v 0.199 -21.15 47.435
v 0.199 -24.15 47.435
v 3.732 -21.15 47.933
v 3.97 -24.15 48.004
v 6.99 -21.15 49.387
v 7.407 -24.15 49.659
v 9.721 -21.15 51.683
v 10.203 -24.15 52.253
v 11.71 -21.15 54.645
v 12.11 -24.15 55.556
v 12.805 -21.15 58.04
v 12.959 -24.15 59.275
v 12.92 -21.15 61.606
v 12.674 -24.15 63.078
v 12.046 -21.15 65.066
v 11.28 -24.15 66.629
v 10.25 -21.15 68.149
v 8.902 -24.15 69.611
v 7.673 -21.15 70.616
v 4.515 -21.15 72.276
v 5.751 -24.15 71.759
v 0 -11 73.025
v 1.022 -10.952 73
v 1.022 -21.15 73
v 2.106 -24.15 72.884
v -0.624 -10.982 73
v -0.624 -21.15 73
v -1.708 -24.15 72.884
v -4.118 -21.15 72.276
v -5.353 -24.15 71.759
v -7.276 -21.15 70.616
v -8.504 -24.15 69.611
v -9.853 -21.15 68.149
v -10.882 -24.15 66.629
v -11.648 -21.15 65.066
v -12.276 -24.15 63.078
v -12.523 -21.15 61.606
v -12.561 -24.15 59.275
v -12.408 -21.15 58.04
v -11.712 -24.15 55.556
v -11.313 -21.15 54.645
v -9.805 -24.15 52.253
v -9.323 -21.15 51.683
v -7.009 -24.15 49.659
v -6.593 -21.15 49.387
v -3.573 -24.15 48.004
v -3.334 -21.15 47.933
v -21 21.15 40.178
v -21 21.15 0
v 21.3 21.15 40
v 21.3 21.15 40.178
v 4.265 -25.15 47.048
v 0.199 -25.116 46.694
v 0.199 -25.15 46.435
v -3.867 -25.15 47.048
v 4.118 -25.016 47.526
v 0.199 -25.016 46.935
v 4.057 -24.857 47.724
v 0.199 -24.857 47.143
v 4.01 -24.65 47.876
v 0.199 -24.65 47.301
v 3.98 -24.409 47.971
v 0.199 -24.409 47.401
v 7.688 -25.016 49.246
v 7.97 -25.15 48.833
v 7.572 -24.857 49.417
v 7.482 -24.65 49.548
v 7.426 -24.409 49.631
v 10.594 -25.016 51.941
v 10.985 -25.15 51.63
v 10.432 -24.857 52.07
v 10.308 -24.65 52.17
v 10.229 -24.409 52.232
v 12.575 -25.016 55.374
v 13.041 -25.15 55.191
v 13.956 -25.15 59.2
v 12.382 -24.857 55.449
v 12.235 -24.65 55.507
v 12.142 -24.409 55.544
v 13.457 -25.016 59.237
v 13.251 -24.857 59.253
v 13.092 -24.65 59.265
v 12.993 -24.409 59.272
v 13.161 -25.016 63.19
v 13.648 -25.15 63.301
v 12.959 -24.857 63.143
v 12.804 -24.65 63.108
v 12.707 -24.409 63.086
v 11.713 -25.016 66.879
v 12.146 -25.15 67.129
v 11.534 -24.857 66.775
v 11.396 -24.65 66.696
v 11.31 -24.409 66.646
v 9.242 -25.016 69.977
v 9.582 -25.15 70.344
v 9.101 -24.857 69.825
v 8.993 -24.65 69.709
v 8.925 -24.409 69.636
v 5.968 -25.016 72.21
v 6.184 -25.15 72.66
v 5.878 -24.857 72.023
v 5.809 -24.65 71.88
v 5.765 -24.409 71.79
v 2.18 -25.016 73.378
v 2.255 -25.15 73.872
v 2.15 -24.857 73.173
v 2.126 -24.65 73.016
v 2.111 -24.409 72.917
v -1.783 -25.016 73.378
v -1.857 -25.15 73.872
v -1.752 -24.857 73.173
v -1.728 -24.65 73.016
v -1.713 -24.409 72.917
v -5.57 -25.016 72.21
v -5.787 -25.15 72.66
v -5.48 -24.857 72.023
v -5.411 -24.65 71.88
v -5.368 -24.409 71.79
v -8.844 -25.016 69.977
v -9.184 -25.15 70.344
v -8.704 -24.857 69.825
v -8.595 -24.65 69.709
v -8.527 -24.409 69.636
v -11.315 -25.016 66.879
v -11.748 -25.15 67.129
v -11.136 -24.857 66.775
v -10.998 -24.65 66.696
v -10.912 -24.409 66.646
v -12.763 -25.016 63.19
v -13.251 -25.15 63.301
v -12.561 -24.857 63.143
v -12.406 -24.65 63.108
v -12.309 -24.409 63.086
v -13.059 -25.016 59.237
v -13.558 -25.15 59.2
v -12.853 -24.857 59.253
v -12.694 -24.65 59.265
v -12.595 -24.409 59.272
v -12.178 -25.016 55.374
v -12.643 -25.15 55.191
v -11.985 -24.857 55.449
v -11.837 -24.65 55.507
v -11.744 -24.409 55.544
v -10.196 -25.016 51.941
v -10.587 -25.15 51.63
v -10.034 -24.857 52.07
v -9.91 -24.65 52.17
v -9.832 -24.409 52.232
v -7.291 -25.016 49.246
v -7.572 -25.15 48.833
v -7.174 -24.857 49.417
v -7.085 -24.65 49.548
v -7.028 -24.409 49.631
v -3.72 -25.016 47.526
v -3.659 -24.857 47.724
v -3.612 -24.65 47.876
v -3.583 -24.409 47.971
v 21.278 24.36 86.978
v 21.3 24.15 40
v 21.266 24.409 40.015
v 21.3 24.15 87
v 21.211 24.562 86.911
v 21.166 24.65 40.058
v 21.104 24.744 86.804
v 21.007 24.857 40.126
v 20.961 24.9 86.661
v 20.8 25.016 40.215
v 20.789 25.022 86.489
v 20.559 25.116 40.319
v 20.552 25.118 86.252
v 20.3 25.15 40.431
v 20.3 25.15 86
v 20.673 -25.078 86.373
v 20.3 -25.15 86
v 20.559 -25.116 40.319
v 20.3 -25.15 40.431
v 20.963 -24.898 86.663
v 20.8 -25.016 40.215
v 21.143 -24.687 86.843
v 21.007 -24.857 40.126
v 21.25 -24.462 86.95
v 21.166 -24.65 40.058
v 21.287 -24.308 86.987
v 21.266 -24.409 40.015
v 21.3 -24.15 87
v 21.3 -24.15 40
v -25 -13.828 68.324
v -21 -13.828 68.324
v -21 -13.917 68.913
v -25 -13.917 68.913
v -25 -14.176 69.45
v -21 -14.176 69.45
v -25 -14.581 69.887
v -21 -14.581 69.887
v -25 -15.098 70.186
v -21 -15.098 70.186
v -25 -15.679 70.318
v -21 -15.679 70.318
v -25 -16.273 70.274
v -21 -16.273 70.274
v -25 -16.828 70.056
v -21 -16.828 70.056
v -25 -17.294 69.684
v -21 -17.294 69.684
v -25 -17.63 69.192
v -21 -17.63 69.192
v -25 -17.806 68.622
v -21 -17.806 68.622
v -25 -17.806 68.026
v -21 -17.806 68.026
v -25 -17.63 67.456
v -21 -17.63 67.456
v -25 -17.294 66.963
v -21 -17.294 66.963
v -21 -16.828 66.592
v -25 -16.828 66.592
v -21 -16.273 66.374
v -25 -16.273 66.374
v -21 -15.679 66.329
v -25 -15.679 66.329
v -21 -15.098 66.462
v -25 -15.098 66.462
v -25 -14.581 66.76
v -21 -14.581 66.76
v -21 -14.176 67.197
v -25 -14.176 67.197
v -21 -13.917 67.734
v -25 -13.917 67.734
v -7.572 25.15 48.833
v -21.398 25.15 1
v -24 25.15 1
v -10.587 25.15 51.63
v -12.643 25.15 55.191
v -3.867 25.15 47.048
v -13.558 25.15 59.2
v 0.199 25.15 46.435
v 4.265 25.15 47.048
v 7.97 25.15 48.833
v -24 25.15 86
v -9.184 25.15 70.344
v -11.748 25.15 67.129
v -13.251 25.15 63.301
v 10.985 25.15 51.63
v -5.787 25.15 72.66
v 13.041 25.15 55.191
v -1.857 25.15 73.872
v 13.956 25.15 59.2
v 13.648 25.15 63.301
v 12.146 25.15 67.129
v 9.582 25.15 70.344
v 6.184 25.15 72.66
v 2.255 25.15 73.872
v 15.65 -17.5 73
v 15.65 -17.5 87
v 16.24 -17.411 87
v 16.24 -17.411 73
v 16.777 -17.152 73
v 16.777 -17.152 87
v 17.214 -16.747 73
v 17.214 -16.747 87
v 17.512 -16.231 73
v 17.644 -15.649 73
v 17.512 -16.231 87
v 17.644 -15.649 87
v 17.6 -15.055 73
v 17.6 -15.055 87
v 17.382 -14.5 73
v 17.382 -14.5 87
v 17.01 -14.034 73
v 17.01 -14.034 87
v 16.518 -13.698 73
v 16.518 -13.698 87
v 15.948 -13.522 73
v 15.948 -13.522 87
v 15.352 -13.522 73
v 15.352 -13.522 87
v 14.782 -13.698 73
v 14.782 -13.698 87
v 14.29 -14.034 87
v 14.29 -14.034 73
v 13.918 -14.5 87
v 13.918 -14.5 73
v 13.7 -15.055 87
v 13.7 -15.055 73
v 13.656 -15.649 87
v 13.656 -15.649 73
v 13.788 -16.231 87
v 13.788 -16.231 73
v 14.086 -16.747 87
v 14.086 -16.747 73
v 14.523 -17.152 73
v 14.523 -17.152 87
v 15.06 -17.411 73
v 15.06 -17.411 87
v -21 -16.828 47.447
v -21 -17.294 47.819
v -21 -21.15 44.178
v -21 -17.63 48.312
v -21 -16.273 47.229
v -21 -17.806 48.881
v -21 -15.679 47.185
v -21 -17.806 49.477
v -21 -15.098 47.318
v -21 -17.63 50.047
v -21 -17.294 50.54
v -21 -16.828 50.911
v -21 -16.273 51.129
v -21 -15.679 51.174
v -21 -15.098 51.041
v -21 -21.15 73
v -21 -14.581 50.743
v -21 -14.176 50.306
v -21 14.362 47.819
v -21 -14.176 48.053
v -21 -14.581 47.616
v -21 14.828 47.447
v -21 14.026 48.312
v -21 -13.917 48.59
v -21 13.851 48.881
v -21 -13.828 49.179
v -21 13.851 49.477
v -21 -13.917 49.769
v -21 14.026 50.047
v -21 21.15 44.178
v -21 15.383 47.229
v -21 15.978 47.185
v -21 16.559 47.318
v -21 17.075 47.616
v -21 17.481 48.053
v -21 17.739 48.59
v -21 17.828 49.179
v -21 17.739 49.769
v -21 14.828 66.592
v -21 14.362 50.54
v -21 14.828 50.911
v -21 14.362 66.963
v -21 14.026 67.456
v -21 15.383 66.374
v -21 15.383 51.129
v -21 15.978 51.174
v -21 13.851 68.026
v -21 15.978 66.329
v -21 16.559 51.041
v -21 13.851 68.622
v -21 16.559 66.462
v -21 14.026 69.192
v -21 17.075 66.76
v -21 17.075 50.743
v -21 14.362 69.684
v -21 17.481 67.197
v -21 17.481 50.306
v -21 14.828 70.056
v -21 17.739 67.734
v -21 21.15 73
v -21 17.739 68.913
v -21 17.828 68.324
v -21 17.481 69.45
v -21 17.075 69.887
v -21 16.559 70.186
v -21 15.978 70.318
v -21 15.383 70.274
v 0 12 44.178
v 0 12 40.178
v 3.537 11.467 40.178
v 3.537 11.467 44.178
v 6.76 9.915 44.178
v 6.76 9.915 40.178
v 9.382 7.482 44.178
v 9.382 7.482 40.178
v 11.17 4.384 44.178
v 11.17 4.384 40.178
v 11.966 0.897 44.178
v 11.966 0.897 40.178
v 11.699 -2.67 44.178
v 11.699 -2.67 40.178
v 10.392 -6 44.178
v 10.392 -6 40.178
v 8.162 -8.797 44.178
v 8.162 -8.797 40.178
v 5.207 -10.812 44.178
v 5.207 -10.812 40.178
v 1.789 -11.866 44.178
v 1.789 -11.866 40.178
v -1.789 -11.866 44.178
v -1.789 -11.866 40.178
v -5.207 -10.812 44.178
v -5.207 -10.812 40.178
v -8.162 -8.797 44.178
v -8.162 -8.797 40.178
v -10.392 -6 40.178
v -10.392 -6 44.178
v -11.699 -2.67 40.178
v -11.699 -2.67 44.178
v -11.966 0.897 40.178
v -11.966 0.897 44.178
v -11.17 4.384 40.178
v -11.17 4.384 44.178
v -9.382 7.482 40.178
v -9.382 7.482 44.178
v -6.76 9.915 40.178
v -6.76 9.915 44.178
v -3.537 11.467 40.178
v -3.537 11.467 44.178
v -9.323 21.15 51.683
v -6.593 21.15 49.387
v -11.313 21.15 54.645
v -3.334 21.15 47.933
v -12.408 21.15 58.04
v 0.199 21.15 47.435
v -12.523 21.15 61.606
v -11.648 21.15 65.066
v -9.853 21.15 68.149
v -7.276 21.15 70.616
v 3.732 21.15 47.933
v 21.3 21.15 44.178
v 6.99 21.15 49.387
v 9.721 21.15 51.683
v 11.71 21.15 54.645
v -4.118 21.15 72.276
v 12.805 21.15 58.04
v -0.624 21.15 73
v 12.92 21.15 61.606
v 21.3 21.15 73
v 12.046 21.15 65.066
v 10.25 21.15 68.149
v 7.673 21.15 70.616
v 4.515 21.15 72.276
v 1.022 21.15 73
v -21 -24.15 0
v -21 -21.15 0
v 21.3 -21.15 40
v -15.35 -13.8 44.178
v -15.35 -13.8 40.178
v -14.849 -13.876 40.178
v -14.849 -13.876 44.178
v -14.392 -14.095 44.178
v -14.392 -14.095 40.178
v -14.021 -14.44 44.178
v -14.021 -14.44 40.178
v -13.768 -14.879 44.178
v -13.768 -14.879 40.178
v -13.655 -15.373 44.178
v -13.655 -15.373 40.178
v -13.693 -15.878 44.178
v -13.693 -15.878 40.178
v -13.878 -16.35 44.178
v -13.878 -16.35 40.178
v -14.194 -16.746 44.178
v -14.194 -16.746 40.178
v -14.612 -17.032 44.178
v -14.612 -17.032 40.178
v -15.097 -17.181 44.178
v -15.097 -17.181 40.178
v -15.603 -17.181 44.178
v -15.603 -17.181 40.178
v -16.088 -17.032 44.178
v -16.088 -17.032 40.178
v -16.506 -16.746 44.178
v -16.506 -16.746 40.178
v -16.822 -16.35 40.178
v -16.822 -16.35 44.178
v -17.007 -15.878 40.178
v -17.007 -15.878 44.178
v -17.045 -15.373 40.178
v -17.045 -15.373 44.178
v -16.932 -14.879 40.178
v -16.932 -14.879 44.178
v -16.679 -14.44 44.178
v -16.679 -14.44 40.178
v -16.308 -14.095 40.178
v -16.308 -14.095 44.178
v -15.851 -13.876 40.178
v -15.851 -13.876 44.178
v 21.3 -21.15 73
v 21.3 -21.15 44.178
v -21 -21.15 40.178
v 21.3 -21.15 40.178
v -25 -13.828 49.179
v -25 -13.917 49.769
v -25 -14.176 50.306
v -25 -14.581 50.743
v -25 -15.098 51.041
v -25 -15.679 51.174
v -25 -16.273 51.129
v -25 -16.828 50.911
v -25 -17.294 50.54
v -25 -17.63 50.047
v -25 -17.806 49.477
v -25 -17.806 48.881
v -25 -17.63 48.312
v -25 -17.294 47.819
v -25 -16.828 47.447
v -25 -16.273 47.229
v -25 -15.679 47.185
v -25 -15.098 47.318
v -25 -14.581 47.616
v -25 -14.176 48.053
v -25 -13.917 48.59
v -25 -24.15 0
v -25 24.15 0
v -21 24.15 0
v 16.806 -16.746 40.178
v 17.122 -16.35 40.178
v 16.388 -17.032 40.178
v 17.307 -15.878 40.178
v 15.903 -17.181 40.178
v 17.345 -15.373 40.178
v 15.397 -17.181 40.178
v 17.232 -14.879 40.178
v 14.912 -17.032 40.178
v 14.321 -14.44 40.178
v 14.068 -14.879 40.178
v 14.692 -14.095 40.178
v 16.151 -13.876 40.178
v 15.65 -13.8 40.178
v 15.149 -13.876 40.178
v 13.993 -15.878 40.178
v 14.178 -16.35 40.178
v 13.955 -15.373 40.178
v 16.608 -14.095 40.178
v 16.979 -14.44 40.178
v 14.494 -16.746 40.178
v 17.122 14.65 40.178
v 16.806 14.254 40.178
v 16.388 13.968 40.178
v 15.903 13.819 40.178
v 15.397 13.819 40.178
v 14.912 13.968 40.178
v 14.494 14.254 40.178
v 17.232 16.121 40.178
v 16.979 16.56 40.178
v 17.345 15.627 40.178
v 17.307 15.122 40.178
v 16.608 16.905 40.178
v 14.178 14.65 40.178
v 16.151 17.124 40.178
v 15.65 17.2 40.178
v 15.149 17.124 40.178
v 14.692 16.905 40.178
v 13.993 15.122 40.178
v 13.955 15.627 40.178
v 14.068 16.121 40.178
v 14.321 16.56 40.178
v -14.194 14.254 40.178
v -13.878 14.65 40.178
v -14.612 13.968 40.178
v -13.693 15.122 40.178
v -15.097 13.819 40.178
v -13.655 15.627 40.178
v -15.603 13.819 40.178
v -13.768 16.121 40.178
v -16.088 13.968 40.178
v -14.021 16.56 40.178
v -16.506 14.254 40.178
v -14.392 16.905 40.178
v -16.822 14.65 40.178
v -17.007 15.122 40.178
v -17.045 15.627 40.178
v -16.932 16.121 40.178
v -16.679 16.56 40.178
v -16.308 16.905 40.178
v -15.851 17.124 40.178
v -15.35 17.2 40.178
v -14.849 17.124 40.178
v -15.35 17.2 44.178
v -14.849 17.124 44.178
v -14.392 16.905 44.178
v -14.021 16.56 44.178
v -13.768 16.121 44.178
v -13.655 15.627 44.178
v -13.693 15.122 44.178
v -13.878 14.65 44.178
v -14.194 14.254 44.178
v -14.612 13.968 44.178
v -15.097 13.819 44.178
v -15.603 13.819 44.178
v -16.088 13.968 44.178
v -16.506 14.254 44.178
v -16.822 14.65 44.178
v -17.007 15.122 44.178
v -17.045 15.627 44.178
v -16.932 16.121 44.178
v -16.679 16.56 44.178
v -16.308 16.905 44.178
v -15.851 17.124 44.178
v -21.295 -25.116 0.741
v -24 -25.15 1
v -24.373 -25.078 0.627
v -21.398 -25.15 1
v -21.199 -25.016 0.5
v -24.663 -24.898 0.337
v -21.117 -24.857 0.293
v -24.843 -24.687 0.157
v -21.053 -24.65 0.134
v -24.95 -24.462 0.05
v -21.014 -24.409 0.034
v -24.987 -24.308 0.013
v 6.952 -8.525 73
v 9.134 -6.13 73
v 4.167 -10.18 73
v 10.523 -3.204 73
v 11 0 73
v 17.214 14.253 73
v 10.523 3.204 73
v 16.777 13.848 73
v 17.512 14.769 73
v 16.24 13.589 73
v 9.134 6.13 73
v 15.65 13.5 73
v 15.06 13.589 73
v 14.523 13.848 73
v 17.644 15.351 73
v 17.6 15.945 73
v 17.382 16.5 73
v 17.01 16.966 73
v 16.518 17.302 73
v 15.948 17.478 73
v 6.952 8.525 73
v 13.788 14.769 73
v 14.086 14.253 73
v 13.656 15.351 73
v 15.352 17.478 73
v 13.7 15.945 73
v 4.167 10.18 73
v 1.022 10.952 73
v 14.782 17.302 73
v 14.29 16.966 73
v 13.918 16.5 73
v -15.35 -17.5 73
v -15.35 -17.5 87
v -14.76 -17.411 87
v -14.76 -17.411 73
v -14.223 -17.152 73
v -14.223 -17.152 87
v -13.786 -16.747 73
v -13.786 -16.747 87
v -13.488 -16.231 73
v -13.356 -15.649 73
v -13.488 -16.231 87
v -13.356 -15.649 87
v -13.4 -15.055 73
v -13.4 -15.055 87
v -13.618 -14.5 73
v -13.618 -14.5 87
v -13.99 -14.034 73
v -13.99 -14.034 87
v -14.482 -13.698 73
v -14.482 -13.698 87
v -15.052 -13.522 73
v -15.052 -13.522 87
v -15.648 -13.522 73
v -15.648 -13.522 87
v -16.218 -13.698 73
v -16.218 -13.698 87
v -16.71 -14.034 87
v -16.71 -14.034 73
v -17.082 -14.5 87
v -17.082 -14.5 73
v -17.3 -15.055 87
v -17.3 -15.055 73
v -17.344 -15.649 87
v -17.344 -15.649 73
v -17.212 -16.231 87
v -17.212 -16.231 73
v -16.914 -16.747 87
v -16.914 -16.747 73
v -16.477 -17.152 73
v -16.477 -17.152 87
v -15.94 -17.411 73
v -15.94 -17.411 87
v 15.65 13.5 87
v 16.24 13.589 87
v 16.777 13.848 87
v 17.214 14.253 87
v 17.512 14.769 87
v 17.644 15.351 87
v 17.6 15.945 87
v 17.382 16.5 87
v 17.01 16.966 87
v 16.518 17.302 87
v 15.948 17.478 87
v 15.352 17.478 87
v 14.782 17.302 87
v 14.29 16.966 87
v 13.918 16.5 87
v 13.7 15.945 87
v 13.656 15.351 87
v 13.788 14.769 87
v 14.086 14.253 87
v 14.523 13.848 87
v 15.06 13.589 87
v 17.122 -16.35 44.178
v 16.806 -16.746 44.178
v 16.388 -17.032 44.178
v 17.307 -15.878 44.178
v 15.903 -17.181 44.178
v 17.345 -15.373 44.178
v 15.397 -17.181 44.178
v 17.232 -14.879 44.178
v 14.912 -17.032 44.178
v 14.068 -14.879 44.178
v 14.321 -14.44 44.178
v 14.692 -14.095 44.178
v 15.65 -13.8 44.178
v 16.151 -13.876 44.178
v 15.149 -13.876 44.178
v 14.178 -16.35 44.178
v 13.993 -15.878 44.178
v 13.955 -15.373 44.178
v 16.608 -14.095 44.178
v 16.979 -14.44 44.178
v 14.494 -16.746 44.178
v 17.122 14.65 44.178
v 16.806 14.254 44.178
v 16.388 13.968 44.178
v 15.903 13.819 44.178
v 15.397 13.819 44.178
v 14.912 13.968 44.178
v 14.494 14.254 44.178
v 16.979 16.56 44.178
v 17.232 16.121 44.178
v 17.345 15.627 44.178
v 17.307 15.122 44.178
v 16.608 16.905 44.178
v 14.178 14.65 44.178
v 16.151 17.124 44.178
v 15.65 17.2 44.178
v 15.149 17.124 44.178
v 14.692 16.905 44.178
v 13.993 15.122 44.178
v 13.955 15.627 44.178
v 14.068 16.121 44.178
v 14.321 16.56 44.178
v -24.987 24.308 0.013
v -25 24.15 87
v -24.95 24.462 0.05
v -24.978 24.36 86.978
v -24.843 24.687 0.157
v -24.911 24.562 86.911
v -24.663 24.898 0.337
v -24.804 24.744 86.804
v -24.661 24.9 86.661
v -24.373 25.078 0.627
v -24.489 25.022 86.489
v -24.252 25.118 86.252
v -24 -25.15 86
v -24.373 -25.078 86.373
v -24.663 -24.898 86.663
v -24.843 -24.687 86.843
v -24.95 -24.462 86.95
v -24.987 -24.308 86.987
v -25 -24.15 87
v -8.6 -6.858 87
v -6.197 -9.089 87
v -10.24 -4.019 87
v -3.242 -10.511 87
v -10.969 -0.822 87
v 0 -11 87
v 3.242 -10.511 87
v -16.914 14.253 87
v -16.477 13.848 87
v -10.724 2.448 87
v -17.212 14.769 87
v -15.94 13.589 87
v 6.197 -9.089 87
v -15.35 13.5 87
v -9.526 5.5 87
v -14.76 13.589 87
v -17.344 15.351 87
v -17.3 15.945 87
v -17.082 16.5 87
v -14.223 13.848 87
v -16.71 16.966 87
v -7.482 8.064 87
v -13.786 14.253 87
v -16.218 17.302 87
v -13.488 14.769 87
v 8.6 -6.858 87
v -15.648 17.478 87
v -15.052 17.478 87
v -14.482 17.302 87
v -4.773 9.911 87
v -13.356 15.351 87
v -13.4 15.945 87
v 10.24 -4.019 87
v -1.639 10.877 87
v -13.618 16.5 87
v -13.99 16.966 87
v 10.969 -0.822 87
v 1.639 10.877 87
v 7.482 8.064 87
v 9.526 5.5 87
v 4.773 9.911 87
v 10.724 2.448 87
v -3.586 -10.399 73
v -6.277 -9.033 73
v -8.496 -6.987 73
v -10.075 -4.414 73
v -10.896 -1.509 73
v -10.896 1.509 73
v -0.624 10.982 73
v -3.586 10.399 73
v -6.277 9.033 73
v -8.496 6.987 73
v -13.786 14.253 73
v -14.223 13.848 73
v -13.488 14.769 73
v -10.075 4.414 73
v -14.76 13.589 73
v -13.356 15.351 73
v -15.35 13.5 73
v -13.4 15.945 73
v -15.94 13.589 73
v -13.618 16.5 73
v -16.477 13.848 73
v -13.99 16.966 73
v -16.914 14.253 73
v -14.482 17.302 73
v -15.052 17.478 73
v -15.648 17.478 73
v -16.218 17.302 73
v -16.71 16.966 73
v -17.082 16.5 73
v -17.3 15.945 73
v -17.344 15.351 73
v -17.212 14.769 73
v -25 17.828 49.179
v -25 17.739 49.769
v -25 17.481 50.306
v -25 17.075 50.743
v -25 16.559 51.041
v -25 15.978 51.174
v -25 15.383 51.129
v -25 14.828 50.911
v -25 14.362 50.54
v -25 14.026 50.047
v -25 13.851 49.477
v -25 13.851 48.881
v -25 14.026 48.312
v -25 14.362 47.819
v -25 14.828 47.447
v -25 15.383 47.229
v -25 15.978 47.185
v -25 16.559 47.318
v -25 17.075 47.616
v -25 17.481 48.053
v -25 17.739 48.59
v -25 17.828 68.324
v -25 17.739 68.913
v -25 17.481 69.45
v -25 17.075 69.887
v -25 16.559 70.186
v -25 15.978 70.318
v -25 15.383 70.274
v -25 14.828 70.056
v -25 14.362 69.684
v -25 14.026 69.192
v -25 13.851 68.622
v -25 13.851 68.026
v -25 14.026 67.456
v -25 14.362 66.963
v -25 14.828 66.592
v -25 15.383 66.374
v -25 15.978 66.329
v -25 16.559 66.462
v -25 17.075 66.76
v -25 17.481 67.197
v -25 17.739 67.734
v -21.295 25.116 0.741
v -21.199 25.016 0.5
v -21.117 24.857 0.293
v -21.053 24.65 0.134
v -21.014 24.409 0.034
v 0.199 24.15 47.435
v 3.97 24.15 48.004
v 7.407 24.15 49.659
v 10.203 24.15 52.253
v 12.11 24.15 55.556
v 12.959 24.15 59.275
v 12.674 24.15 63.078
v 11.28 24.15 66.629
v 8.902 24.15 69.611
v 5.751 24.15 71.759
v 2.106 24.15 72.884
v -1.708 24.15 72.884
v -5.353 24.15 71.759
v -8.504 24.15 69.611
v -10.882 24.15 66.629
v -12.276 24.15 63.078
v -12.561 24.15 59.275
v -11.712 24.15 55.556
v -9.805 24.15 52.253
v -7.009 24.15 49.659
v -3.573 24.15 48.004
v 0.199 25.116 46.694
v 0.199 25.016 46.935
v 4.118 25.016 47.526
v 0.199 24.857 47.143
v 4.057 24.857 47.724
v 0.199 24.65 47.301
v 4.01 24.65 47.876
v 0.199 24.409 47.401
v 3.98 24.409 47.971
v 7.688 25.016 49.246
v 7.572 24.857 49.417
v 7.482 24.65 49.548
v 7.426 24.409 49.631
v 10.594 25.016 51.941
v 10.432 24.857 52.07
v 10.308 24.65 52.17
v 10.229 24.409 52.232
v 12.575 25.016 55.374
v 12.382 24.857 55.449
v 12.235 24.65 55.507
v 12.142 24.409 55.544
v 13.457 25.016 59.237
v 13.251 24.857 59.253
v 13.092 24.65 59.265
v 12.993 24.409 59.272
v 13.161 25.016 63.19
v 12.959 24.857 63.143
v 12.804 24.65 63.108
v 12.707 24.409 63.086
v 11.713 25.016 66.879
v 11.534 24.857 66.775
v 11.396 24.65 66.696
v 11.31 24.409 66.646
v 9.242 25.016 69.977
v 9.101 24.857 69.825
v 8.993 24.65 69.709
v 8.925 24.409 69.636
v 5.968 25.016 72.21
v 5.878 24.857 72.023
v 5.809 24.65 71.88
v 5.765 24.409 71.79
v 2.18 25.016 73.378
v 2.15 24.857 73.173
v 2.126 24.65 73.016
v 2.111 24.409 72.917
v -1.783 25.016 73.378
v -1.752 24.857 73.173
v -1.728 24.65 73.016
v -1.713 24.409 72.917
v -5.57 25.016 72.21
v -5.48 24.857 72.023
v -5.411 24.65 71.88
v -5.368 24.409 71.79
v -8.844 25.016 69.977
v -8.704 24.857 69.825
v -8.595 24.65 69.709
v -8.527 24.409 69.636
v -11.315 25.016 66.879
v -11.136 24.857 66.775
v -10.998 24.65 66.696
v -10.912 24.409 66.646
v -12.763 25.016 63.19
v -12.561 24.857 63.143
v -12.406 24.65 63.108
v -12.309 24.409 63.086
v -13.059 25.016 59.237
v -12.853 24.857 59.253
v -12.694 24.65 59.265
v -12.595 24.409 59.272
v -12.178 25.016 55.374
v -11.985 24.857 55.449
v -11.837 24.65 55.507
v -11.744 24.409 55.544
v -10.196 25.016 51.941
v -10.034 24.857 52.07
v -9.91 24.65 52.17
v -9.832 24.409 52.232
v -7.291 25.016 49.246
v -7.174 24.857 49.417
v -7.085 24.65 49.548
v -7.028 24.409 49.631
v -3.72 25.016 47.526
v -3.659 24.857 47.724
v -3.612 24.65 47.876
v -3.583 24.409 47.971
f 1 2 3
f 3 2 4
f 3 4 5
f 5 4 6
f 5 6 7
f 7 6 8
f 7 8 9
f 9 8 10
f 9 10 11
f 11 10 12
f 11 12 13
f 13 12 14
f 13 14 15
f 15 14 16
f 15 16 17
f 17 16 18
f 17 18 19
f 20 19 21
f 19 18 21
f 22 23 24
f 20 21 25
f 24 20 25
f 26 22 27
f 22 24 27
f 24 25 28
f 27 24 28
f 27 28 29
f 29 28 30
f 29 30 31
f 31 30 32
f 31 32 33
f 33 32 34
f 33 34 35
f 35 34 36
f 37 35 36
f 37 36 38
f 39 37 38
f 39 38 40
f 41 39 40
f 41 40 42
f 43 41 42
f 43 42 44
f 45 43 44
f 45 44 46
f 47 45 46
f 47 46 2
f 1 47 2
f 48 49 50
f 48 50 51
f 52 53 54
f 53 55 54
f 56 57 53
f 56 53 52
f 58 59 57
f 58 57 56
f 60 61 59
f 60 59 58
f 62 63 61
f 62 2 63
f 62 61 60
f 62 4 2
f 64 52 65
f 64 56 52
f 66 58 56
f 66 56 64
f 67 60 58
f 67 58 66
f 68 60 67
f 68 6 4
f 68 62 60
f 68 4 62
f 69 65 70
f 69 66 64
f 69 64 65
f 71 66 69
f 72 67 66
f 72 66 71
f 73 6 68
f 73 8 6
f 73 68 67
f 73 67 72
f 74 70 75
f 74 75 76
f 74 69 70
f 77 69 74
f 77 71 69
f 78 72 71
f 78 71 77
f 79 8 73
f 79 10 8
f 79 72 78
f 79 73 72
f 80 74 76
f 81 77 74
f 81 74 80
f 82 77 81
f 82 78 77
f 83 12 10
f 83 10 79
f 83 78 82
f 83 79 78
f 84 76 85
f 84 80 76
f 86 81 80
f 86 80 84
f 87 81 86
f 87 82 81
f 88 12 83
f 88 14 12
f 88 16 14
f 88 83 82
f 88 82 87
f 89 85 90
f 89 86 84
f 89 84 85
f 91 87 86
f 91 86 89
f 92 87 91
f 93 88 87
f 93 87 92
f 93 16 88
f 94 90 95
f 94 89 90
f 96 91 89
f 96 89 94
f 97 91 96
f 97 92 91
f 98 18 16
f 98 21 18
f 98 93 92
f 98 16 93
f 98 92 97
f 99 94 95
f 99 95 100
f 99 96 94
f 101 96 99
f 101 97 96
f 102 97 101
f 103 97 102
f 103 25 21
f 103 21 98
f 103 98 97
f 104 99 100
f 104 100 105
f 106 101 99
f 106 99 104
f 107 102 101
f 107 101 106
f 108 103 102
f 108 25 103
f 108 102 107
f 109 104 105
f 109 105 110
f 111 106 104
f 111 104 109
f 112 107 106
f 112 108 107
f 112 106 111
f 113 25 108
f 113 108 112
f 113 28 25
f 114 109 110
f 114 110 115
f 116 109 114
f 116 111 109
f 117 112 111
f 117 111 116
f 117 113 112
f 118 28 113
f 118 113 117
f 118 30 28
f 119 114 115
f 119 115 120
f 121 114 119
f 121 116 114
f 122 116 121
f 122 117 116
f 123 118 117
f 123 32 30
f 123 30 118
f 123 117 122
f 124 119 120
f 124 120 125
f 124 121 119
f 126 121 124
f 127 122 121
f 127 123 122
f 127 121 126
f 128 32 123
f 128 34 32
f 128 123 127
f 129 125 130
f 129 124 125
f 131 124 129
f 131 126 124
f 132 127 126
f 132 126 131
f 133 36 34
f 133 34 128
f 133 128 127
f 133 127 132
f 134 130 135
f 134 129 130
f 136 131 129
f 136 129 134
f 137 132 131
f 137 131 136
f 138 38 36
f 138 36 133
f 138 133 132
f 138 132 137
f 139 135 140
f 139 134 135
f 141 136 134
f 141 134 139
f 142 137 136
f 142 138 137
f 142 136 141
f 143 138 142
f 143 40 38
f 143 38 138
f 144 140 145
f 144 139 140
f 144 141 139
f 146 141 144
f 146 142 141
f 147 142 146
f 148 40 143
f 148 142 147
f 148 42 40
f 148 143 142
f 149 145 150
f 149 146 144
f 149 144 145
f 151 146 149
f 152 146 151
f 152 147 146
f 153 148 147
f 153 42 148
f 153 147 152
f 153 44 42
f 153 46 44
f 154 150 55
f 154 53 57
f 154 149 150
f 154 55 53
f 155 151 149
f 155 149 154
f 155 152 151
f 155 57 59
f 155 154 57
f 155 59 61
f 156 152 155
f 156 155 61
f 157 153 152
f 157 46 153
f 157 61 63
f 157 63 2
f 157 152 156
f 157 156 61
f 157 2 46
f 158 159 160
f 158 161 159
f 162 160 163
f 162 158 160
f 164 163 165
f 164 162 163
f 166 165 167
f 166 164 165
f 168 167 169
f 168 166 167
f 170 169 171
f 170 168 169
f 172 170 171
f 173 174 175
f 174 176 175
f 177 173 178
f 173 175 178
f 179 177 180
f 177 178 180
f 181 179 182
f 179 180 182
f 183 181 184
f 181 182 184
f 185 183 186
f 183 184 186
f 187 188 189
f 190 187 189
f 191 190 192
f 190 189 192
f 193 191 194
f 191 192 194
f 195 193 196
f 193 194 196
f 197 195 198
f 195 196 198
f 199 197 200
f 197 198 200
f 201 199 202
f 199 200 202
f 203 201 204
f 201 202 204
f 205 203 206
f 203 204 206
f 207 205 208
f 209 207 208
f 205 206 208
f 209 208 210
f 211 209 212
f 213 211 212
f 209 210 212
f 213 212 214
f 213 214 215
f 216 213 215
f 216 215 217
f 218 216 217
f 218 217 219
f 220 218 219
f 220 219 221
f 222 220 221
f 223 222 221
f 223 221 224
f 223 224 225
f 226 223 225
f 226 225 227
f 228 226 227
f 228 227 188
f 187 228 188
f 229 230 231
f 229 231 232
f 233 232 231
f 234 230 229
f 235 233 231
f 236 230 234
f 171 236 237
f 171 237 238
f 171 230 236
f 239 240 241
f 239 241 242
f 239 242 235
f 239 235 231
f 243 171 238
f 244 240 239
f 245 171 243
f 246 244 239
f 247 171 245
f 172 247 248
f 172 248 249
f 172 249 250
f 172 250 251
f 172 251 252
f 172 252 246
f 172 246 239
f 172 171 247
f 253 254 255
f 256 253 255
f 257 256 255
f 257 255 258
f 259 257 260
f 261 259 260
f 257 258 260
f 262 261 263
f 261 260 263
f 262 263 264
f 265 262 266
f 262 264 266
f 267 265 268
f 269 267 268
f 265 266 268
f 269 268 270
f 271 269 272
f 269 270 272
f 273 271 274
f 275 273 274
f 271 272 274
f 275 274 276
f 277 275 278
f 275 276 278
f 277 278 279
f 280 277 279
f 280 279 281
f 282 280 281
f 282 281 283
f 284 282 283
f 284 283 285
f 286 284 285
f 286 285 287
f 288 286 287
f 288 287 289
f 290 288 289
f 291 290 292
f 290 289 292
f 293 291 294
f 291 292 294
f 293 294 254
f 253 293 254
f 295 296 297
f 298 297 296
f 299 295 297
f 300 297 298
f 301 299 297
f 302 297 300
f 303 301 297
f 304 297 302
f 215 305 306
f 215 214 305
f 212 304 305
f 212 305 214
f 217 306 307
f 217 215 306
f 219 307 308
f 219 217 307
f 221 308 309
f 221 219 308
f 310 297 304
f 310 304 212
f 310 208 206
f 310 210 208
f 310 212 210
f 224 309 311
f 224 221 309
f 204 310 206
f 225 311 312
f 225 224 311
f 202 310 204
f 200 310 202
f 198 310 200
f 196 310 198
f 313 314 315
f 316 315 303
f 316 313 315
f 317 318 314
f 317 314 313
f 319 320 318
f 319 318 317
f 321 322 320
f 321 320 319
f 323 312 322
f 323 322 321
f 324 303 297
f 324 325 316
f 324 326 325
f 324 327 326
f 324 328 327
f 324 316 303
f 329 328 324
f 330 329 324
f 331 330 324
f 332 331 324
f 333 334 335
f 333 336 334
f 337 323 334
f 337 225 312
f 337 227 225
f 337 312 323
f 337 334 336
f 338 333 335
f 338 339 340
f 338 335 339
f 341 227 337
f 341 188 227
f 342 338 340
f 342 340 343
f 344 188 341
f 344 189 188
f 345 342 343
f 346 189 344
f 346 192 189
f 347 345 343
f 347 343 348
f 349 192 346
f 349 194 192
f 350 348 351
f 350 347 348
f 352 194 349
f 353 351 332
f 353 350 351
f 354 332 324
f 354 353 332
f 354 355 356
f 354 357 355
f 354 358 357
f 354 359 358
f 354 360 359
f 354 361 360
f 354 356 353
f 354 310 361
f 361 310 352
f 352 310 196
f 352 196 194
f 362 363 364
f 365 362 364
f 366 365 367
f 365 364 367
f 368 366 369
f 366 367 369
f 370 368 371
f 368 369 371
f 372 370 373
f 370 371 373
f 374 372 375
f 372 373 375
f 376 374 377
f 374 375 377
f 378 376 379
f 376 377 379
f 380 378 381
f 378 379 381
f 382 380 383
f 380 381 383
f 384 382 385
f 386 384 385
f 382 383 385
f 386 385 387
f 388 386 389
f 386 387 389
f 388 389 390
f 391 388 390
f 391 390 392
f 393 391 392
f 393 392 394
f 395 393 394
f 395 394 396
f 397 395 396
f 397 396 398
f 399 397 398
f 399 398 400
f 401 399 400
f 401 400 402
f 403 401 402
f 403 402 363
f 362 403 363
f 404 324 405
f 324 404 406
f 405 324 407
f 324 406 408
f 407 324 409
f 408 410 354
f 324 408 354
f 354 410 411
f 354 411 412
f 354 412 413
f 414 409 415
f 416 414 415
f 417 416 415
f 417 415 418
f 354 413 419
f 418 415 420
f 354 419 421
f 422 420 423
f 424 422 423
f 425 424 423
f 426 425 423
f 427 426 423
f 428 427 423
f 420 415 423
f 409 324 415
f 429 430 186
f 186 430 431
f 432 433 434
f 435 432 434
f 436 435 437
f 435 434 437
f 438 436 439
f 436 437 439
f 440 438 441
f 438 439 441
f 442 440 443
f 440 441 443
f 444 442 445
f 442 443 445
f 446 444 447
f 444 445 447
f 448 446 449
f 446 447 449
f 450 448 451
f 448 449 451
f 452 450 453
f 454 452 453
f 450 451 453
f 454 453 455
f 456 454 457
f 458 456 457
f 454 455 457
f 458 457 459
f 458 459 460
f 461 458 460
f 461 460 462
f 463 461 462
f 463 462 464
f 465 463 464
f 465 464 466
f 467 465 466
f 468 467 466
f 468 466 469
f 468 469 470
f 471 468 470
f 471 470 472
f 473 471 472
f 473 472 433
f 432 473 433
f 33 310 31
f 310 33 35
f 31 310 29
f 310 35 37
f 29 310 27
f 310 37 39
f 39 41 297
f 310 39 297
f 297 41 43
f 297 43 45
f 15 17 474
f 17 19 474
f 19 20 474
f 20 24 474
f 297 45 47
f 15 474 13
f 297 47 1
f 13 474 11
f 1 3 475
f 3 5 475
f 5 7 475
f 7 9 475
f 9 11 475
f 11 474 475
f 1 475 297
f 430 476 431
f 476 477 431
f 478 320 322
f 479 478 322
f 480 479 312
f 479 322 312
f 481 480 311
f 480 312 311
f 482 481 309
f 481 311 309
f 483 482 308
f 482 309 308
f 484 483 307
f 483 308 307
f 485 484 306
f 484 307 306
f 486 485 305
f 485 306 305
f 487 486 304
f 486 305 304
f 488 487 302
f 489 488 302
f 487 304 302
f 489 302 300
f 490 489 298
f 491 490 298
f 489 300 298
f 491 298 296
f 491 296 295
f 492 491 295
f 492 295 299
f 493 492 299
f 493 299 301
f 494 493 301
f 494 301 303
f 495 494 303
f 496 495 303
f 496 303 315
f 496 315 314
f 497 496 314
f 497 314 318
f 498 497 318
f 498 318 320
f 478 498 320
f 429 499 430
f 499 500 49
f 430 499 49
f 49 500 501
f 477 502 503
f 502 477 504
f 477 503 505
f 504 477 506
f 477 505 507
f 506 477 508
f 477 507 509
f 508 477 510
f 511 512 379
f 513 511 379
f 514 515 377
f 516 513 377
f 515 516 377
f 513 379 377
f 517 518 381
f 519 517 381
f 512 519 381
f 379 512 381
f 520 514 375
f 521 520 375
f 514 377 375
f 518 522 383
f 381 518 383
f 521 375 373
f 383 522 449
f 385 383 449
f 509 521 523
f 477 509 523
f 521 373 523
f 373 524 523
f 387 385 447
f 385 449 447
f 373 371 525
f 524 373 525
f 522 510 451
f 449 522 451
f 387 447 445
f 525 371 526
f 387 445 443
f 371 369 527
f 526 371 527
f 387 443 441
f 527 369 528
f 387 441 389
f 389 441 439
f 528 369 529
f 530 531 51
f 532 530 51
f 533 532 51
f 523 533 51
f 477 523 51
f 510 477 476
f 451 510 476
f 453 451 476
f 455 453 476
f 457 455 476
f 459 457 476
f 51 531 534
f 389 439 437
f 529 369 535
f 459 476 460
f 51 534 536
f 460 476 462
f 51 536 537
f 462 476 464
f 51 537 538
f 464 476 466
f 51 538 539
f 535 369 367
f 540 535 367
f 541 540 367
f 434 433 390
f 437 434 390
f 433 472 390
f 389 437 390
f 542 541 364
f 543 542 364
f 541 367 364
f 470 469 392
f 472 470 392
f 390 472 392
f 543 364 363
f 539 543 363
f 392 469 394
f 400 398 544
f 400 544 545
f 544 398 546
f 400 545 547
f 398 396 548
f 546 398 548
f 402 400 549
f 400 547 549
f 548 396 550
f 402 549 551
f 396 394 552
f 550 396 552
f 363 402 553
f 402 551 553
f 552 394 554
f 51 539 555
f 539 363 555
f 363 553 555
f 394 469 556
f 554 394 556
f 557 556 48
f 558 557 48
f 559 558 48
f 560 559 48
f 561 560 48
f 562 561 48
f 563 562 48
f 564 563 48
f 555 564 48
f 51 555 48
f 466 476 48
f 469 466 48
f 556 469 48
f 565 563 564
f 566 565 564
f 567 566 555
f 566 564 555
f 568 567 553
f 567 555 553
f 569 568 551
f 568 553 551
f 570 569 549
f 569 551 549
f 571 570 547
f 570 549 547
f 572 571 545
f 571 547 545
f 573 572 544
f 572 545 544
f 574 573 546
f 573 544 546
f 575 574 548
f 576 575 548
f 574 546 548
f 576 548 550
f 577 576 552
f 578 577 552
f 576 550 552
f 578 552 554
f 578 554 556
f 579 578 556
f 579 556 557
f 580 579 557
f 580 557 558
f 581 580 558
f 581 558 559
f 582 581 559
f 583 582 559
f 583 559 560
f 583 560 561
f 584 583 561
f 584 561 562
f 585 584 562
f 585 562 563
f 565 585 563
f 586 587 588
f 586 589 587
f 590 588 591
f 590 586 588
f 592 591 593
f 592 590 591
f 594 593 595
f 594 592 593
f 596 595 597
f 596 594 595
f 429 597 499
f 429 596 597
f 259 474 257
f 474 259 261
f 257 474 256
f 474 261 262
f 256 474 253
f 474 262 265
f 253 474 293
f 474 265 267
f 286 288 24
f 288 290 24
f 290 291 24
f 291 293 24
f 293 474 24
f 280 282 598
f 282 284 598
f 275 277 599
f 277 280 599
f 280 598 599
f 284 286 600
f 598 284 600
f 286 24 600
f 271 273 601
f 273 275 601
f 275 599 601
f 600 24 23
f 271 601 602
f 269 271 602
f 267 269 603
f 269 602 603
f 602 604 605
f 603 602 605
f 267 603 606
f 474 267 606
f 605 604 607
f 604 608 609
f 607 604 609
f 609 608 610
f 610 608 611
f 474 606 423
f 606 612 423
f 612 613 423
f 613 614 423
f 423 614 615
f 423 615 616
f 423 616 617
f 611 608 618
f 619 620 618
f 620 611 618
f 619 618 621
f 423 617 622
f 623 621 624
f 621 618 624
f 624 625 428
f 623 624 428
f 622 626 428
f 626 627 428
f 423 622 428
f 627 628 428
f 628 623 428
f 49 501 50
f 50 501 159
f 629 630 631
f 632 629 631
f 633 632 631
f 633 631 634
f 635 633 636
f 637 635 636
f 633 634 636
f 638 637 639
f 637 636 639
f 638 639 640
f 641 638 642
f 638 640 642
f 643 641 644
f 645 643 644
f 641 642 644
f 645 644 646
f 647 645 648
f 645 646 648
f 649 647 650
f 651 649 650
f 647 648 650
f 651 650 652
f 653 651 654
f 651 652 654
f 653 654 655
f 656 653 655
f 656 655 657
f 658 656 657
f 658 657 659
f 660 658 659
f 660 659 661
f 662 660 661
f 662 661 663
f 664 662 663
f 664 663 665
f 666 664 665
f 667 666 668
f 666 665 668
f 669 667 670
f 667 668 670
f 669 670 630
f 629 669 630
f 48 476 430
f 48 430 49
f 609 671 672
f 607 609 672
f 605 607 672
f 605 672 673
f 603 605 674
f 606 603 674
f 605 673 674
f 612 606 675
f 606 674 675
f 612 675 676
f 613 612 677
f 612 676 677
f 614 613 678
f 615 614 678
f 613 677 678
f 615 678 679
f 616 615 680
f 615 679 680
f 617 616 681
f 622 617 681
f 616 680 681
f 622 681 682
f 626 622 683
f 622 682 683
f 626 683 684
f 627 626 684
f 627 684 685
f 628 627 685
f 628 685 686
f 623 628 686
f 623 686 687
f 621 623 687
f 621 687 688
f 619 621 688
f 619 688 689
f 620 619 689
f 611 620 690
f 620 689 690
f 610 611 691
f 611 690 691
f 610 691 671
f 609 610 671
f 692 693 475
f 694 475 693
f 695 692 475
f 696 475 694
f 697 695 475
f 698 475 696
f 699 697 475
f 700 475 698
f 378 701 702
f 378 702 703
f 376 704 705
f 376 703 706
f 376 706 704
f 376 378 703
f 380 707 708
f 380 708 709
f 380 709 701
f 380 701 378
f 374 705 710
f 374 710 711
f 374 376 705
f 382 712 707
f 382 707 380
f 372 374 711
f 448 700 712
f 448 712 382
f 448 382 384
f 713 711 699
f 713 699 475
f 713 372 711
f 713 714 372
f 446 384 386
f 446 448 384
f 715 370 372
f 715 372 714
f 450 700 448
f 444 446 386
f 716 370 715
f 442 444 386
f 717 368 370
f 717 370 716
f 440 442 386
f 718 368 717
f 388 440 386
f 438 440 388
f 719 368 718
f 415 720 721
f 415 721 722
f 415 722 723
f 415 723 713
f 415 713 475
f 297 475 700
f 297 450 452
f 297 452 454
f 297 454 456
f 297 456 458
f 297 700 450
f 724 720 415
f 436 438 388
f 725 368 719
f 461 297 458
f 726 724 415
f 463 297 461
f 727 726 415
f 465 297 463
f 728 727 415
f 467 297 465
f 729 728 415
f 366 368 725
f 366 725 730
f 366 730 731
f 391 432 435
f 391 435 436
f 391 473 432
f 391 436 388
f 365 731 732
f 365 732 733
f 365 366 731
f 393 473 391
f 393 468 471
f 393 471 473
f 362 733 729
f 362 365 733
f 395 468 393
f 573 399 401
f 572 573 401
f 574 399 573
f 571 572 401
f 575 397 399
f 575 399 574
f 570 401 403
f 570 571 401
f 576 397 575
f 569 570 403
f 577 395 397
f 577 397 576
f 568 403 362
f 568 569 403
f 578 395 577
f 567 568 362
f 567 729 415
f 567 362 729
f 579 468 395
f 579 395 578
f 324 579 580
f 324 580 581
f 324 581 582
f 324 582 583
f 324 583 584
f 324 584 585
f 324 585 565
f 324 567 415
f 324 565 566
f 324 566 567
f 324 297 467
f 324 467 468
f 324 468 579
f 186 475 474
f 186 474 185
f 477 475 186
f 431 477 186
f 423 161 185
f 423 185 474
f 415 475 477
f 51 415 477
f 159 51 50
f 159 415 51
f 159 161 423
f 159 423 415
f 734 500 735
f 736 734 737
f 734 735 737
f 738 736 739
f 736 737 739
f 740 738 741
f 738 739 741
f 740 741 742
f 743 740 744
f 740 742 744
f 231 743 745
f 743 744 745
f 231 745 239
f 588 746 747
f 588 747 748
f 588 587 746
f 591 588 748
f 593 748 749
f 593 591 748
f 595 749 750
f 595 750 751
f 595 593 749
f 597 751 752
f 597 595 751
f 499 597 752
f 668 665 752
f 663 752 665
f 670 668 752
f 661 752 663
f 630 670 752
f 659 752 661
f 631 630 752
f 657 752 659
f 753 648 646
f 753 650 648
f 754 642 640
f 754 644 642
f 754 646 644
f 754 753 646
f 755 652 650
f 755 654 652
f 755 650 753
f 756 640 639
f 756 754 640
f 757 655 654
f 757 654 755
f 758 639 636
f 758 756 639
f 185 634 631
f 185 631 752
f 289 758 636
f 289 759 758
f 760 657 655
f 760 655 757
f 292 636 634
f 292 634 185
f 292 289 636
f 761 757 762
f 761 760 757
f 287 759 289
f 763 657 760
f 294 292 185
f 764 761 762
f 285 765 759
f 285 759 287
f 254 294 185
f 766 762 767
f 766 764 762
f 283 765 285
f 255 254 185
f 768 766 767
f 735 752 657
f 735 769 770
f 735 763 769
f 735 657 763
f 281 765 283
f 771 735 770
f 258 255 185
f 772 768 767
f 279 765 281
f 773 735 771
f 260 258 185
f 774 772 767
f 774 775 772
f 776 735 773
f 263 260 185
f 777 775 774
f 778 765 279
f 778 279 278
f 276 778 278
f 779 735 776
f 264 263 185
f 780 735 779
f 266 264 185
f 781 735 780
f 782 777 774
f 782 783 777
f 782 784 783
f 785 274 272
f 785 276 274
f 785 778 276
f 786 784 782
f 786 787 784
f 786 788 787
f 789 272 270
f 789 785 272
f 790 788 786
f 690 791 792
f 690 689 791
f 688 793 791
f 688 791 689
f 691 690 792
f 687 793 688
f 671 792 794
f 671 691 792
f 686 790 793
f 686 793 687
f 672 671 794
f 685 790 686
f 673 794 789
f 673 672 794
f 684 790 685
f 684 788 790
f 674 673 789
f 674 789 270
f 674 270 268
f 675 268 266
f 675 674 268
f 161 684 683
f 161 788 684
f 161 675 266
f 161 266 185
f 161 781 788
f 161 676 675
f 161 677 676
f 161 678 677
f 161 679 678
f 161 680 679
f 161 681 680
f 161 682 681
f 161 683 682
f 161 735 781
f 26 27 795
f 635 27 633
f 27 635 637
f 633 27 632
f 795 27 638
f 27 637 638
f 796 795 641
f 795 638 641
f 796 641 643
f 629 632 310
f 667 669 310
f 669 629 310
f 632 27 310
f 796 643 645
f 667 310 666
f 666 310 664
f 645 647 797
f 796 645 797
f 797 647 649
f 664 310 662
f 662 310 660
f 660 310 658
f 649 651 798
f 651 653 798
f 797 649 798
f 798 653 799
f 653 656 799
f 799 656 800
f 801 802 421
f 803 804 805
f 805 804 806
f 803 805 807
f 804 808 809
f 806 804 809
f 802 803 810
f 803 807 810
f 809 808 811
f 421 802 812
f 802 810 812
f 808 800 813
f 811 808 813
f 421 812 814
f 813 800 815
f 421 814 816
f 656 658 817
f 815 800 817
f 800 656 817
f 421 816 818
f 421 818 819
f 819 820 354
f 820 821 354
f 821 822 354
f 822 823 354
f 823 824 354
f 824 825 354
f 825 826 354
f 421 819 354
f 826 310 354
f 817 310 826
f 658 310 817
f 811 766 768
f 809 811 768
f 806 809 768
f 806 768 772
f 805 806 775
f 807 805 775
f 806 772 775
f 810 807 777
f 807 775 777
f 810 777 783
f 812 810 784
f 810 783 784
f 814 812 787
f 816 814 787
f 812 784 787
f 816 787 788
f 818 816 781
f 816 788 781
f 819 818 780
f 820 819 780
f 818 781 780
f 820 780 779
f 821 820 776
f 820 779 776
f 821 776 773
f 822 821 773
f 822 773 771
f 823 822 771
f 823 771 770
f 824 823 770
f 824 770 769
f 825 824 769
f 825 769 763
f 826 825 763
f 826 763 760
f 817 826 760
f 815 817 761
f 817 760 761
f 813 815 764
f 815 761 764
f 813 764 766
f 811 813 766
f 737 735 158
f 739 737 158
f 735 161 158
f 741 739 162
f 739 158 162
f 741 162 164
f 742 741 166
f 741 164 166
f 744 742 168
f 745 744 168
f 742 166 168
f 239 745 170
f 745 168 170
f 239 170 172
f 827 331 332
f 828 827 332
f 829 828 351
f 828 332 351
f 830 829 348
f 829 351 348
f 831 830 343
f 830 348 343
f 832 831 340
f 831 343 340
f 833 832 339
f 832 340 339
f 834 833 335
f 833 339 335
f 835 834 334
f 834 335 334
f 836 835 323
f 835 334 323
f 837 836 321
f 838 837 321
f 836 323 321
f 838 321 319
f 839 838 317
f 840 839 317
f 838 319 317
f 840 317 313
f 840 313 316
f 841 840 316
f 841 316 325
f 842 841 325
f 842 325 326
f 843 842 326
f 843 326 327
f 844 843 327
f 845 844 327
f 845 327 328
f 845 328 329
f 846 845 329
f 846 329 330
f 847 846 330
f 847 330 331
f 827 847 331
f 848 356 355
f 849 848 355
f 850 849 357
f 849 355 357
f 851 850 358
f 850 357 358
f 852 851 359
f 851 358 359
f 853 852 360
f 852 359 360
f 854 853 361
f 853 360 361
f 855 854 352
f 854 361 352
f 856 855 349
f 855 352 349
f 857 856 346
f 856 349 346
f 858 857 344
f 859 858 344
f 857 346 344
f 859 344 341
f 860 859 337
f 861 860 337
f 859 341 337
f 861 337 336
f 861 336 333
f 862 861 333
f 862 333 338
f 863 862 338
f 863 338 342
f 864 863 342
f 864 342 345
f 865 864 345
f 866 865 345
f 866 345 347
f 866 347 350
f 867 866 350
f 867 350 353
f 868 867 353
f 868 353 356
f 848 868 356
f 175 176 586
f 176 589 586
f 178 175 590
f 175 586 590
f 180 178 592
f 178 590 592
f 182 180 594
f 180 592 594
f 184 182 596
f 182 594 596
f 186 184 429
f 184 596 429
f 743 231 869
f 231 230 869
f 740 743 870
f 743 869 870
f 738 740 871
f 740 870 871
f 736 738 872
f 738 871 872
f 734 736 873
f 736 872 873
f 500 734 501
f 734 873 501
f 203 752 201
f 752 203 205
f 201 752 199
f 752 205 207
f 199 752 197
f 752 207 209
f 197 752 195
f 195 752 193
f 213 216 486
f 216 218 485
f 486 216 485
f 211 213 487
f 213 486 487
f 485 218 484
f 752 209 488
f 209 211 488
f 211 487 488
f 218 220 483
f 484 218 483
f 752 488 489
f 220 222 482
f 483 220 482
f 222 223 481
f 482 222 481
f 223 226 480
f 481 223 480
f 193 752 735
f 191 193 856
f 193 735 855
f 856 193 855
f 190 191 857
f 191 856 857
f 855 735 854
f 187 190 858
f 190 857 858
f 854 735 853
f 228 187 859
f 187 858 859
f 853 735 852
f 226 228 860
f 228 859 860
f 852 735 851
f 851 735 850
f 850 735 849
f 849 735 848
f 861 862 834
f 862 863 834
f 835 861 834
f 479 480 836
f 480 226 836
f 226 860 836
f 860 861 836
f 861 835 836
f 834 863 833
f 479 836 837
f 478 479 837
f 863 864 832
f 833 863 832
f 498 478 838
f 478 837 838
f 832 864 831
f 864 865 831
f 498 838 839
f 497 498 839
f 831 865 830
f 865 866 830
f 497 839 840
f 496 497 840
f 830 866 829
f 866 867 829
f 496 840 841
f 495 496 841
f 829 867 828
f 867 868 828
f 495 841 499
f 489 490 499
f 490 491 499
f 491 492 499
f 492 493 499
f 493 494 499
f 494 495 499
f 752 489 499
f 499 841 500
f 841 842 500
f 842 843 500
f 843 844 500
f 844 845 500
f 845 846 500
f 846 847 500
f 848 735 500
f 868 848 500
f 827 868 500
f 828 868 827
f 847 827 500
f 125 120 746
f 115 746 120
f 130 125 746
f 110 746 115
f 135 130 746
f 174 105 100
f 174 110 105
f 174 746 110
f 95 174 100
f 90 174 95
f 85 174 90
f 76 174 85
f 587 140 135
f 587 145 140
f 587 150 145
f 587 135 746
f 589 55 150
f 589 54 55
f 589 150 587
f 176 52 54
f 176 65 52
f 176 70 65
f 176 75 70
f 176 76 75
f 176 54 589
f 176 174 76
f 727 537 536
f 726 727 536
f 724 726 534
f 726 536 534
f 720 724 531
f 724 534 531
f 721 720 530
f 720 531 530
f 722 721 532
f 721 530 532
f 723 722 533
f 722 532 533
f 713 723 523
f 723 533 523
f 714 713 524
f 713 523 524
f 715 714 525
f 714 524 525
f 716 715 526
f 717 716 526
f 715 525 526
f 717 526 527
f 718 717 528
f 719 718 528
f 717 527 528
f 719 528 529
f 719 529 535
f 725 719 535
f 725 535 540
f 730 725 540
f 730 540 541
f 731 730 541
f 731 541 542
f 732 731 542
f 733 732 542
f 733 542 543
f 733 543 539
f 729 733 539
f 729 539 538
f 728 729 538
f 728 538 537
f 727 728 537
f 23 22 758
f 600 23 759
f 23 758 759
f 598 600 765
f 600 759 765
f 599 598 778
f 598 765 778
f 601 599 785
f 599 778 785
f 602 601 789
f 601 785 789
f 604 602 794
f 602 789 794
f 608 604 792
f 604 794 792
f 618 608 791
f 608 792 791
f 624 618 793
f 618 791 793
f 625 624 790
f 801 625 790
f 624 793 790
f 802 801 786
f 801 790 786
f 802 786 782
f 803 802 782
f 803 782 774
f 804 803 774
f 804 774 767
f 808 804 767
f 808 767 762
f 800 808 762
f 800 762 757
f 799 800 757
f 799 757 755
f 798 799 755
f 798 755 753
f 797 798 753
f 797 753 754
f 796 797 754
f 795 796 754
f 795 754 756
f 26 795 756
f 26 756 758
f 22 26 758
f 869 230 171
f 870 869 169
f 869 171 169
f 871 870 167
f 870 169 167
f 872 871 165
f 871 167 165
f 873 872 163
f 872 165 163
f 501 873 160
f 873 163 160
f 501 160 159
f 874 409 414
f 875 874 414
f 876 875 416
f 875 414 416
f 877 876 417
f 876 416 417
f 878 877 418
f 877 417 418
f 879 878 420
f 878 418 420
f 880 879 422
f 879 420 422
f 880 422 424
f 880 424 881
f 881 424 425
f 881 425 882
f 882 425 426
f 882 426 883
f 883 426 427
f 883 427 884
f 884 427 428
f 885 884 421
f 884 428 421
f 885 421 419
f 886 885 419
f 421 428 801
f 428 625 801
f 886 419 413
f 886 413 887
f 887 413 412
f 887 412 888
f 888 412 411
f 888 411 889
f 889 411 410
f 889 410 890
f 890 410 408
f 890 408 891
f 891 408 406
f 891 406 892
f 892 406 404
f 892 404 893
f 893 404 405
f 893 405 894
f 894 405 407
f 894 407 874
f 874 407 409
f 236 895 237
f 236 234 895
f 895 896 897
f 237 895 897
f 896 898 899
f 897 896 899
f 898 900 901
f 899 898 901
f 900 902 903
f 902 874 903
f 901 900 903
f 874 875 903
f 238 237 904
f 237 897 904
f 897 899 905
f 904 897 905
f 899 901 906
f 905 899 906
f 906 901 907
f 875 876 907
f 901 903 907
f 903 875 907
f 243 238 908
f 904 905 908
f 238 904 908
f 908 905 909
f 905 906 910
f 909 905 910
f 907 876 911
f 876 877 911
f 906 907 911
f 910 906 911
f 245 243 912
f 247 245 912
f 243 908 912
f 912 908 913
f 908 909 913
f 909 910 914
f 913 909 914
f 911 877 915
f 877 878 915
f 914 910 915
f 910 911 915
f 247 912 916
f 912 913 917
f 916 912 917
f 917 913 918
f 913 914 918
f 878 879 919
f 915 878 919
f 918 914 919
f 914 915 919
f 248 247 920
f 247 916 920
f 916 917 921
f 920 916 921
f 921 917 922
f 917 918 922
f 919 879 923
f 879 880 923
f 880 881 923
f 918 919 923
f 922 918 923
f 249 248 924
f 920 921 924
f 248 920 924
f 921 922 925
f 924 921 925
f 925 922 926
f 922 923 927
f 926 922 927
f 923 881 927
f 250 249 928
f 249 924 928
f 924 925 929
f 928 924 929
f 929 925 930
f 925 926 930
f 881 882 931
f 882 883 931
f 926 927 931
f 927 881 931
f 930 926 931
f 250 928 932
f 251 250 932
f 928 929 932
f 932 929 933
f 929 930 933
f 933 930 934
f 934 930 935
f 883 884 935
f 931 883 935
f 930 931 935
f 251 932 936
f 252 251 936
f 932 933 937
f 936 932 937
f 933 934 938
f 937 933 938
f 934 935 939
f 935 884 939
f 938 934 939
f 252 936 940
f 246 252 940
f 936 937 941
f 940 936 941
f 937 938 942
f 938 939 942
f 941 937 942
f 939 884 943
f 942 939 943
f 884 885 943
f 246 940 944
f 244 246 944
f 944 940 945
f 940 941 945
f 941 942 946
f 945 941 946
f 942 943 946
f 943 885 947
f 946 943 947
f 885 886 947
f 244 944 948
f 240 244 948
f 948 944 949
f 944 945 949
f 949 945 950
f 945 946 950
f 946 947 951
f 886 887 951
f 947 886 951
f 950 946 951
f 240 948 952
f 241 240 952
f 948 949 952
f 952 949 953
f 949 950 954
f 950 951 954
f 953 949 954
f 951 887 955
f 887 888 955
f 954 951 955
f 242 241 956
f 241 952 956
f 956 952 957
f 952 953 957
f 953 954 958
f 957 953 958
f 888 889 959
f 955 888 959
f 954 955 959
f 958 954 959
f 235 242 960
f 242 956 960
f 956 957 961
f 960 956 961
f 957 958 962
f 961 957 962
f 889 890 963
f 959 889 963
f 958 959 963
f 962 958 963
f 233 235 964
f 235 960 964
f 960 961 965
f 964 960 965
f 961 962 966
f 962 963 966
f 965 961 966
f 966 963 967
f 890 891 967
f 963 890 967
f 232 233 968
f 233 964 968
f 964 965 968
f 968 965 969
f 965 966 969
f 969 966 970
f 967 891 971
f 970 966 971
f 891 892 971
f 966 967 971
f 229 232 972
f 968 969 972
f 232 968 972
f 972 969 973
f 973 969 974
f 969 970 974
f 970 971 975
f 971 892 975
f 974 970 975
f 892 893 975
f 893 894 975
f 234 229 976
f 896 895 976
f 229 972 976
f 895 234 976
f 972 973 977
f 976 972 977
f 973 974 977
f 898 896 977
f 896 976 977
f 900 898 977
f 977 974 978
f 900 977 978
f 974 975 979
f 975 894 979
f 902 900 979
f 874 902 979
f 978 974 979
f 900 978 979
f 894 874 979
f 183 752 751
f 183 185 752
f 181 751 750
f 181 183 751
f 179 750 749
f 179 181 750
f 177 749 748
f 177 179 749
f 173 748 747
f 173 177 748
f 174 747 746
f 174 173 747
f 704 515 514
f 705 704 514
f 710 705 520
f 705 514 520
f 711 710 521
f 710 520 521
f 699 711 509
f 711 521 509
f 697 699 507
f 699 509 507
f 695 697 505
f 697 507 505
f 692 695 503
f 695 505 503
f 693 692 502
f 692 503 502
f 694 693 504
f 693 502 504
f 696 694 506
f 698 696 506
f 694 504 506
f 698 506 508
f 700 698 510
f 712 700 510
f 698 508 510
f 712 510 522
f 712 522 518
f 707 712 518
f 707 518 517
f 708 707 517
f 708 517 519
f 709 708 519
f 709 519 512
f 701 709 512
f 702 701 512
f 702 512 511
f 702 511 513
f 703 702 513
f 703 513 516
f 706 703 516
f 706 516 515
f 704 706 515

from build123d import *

# Parameters (mm, degrees)
SKETCH029_W     = 42.3
SKETCH029_H     = 87
PAD013_DEPTH    = 4
SKETCH030_W     = 42.3
SKETCH030_H     = 4
SKETCH030_H_2   = 14
PAD014_DEPTH    = 42.3
SKETCH032_R     = 11
POCKET013_DEPTH = 14
SKETCH031_R     = 1.7
SKETCH031_R_2   = 12
POCKET014_DEPTH = 5
SKETCH033_W     = 87
SKETCH033_H     = 46.3
PAD015_DEPTH    = 4
SKETCH034_W     = 87
SKETCH034_H     = 46.3
PAD016_DEPTH    = 4
SKETCH035_R     = 2
POCKET015_DEPTH = 14
POCKET016_DEPTH = 51
SKETCH037_R     = 12.795503
POCKET017_DEPTH = 51
SKETCH038_R     = 2
POCKET018_DEPTH = 5
FILLET002_R     = 1


with BuildPart() as part:
    # Sketch029 → Pad013 (new body)
    with BuildSketch(Plane.YZ):
        with Locations((0, 43.5)):
            Rectangle(SKETCH029_W, SKETCH029_H)
    extrude(amount=PAD013_DEPTH)

    # Sketch030 (on Face6 of Pad013) → Pad014 (join)
    with BuildSketch(Plane.YZ.offset(4)):
        with Locations((0, 42.178345)):
            Rectangle(SKETCH030_W, SKETCH030_H)
        with Locations((0, 80)):
            Rectangle(SKETCH030_W, SKETCH030_H_2)
    extrude(amount=PAD014_DEPTH)

    # Sketch032 (on Face13 of Pad014) → Pocket013 (cut)
    with BuildSketch(Plane(origin=(0, 0, 87), x_dir=(0, -1, 0), z_dir=(0, 0, 1))):
        with Locations((0, 25)):
            Circle(SKETCH032_R)
    extrude(amount=-POCKET013_DEPTH, mode=Mode.SUBTRACT)

    # Sketch031 (on Face12 of Pad014) → Pocket014 (cut)
    with BuildSketch(Plane.YX.offset(-40.178345)):
        with Locations((-15.5, 40.65)):
            Circle(SKETCH031_R)
        with Locations((15.5, 40.65)):
            Circle(SKETCH031_R)
        with Locations((15.5, 9.65)):
            Circle(SKETCH031_R)
        with Locations((-15.5, 9.65)):
            Circle(SKETCH031_R)
        with Locations((0, 25)):
            Circle(SKETCH031_R_2)
    extrude(amount=-POCKET014_DEPTH, mode=Mode.SUBTRACT)

    # Sketch033 (on Face3 of Pocket014) → Pad015 (join)
    with BuildSketch(Plane.ZX.offset(21.15)):
        with Locations((43.5, 23.15)):
            Rectangle(SKETCH033_W, SKETCH033_H)
    extrude(amount=PAD015_DEPTH)

    # Sketch034 (on Face2 of Pad015) → Pad016 (join)
    with BuildSketch(Plane(origin=(0, -21.15, 0), x_dir=(0, 0, -1), z_dir=(0, -1, 0))):
        with Locations((-43.5, 23.15)):
            Rectangle(SKETCH034_W, SKETCH034_H)
    extrude(amount=PAD016_DEPTH)

    # Sketch035 (on Face22 of Pad016) → Pocket015 (cut)
    with BuildSketch(Plane(origin=(0, 0, 87), x_dir=(0, -1, 0), z_dir=(0, 0, 1))):
        with Locations((-15.5, 40.65)):
            Circle(SKETCH035_R)
        with Locations((15.5, 40.65)):
            Circle(SKETCH035_R)
        with Locations((15.5, 9.65)):
            Circle(SKETCH035_R)
        with Locations((-15.5, 9.65)):
            Circle(SKETCH035_R)
    extrude(amount=-POCKET015_DEPTH, mode=Mode.SUBTRACT)

    # Sketch036 (on Face13 of Pocket015) → Pocket016 (cut)
    with BuildSketch(Plane.ZX.offset(25.15)):
        Polygon((0, 4), (40, 46.3), (0, 46.3), align=None)
    extrude(amount=-POCKET016_DEPTH, mode=Mode.SUBTRACT)

    # Sketch037 (on Face7 of Pocket016) → Pocket017 (cut)
    with BuildSketch(Plane(origin=(0, -25.15, 0), x_dir=(0, 0, -1), z_dir=(0, -1, 0))):
        with Locations((-60.230976, 25.198834)):
            Circle(SKETCH037_R)
    extrude(amount=-POCKET017_DEPTH, mode=Mode.SUBTRACT)

    # Sketch038 → Pocket018 (cut)
    with BuildSketch(Plane.YZ.offset(4)):
        with Locations((-15.828298, 68.323807)):
            Circle(SKETCH038_R)
        with Locations((15.828298, 68.323807)):
            Circle(SKETCH038_R)
        with Locations((-15.828298, 49.17934)):
            Circle(SKETCH038_R)
        with Locations((15.828298, 49.17934)):
            Circle(SKETCH038_R)
    extrude(amount=-POCKET018_DEPTH, mode=Mode.SUBTRACT)

    # Fillet002
    fillet002_edges = [part.edges().sort_by_distance(p)[0] for p in [
        (2, -25.15, 0),
        (25.15, -25.15, 20),
        (0, -25.15, 43.5),
        (46.3, -25.15, 63.5),
        (23.15, -25.15, 87),
        (25.198834, -25.15, 73.026479),
        (2, 25.15, 0),
        (25.15, 25.15, 20),
        (0, 25.15, 43.5),
        (46.3, 25.15, 63.5),
        (23.15, 25.15, 87),
        (25.198834, 25.15, 73.026479),
    ]]
    fillet(fillet002_edges, radius=FILLET002_R)


with BuildPart() as part_1:
    # Body013 placement: moved
    add(part.part.moved(Location((-25, 0, 0))))


solid = part_1.part
